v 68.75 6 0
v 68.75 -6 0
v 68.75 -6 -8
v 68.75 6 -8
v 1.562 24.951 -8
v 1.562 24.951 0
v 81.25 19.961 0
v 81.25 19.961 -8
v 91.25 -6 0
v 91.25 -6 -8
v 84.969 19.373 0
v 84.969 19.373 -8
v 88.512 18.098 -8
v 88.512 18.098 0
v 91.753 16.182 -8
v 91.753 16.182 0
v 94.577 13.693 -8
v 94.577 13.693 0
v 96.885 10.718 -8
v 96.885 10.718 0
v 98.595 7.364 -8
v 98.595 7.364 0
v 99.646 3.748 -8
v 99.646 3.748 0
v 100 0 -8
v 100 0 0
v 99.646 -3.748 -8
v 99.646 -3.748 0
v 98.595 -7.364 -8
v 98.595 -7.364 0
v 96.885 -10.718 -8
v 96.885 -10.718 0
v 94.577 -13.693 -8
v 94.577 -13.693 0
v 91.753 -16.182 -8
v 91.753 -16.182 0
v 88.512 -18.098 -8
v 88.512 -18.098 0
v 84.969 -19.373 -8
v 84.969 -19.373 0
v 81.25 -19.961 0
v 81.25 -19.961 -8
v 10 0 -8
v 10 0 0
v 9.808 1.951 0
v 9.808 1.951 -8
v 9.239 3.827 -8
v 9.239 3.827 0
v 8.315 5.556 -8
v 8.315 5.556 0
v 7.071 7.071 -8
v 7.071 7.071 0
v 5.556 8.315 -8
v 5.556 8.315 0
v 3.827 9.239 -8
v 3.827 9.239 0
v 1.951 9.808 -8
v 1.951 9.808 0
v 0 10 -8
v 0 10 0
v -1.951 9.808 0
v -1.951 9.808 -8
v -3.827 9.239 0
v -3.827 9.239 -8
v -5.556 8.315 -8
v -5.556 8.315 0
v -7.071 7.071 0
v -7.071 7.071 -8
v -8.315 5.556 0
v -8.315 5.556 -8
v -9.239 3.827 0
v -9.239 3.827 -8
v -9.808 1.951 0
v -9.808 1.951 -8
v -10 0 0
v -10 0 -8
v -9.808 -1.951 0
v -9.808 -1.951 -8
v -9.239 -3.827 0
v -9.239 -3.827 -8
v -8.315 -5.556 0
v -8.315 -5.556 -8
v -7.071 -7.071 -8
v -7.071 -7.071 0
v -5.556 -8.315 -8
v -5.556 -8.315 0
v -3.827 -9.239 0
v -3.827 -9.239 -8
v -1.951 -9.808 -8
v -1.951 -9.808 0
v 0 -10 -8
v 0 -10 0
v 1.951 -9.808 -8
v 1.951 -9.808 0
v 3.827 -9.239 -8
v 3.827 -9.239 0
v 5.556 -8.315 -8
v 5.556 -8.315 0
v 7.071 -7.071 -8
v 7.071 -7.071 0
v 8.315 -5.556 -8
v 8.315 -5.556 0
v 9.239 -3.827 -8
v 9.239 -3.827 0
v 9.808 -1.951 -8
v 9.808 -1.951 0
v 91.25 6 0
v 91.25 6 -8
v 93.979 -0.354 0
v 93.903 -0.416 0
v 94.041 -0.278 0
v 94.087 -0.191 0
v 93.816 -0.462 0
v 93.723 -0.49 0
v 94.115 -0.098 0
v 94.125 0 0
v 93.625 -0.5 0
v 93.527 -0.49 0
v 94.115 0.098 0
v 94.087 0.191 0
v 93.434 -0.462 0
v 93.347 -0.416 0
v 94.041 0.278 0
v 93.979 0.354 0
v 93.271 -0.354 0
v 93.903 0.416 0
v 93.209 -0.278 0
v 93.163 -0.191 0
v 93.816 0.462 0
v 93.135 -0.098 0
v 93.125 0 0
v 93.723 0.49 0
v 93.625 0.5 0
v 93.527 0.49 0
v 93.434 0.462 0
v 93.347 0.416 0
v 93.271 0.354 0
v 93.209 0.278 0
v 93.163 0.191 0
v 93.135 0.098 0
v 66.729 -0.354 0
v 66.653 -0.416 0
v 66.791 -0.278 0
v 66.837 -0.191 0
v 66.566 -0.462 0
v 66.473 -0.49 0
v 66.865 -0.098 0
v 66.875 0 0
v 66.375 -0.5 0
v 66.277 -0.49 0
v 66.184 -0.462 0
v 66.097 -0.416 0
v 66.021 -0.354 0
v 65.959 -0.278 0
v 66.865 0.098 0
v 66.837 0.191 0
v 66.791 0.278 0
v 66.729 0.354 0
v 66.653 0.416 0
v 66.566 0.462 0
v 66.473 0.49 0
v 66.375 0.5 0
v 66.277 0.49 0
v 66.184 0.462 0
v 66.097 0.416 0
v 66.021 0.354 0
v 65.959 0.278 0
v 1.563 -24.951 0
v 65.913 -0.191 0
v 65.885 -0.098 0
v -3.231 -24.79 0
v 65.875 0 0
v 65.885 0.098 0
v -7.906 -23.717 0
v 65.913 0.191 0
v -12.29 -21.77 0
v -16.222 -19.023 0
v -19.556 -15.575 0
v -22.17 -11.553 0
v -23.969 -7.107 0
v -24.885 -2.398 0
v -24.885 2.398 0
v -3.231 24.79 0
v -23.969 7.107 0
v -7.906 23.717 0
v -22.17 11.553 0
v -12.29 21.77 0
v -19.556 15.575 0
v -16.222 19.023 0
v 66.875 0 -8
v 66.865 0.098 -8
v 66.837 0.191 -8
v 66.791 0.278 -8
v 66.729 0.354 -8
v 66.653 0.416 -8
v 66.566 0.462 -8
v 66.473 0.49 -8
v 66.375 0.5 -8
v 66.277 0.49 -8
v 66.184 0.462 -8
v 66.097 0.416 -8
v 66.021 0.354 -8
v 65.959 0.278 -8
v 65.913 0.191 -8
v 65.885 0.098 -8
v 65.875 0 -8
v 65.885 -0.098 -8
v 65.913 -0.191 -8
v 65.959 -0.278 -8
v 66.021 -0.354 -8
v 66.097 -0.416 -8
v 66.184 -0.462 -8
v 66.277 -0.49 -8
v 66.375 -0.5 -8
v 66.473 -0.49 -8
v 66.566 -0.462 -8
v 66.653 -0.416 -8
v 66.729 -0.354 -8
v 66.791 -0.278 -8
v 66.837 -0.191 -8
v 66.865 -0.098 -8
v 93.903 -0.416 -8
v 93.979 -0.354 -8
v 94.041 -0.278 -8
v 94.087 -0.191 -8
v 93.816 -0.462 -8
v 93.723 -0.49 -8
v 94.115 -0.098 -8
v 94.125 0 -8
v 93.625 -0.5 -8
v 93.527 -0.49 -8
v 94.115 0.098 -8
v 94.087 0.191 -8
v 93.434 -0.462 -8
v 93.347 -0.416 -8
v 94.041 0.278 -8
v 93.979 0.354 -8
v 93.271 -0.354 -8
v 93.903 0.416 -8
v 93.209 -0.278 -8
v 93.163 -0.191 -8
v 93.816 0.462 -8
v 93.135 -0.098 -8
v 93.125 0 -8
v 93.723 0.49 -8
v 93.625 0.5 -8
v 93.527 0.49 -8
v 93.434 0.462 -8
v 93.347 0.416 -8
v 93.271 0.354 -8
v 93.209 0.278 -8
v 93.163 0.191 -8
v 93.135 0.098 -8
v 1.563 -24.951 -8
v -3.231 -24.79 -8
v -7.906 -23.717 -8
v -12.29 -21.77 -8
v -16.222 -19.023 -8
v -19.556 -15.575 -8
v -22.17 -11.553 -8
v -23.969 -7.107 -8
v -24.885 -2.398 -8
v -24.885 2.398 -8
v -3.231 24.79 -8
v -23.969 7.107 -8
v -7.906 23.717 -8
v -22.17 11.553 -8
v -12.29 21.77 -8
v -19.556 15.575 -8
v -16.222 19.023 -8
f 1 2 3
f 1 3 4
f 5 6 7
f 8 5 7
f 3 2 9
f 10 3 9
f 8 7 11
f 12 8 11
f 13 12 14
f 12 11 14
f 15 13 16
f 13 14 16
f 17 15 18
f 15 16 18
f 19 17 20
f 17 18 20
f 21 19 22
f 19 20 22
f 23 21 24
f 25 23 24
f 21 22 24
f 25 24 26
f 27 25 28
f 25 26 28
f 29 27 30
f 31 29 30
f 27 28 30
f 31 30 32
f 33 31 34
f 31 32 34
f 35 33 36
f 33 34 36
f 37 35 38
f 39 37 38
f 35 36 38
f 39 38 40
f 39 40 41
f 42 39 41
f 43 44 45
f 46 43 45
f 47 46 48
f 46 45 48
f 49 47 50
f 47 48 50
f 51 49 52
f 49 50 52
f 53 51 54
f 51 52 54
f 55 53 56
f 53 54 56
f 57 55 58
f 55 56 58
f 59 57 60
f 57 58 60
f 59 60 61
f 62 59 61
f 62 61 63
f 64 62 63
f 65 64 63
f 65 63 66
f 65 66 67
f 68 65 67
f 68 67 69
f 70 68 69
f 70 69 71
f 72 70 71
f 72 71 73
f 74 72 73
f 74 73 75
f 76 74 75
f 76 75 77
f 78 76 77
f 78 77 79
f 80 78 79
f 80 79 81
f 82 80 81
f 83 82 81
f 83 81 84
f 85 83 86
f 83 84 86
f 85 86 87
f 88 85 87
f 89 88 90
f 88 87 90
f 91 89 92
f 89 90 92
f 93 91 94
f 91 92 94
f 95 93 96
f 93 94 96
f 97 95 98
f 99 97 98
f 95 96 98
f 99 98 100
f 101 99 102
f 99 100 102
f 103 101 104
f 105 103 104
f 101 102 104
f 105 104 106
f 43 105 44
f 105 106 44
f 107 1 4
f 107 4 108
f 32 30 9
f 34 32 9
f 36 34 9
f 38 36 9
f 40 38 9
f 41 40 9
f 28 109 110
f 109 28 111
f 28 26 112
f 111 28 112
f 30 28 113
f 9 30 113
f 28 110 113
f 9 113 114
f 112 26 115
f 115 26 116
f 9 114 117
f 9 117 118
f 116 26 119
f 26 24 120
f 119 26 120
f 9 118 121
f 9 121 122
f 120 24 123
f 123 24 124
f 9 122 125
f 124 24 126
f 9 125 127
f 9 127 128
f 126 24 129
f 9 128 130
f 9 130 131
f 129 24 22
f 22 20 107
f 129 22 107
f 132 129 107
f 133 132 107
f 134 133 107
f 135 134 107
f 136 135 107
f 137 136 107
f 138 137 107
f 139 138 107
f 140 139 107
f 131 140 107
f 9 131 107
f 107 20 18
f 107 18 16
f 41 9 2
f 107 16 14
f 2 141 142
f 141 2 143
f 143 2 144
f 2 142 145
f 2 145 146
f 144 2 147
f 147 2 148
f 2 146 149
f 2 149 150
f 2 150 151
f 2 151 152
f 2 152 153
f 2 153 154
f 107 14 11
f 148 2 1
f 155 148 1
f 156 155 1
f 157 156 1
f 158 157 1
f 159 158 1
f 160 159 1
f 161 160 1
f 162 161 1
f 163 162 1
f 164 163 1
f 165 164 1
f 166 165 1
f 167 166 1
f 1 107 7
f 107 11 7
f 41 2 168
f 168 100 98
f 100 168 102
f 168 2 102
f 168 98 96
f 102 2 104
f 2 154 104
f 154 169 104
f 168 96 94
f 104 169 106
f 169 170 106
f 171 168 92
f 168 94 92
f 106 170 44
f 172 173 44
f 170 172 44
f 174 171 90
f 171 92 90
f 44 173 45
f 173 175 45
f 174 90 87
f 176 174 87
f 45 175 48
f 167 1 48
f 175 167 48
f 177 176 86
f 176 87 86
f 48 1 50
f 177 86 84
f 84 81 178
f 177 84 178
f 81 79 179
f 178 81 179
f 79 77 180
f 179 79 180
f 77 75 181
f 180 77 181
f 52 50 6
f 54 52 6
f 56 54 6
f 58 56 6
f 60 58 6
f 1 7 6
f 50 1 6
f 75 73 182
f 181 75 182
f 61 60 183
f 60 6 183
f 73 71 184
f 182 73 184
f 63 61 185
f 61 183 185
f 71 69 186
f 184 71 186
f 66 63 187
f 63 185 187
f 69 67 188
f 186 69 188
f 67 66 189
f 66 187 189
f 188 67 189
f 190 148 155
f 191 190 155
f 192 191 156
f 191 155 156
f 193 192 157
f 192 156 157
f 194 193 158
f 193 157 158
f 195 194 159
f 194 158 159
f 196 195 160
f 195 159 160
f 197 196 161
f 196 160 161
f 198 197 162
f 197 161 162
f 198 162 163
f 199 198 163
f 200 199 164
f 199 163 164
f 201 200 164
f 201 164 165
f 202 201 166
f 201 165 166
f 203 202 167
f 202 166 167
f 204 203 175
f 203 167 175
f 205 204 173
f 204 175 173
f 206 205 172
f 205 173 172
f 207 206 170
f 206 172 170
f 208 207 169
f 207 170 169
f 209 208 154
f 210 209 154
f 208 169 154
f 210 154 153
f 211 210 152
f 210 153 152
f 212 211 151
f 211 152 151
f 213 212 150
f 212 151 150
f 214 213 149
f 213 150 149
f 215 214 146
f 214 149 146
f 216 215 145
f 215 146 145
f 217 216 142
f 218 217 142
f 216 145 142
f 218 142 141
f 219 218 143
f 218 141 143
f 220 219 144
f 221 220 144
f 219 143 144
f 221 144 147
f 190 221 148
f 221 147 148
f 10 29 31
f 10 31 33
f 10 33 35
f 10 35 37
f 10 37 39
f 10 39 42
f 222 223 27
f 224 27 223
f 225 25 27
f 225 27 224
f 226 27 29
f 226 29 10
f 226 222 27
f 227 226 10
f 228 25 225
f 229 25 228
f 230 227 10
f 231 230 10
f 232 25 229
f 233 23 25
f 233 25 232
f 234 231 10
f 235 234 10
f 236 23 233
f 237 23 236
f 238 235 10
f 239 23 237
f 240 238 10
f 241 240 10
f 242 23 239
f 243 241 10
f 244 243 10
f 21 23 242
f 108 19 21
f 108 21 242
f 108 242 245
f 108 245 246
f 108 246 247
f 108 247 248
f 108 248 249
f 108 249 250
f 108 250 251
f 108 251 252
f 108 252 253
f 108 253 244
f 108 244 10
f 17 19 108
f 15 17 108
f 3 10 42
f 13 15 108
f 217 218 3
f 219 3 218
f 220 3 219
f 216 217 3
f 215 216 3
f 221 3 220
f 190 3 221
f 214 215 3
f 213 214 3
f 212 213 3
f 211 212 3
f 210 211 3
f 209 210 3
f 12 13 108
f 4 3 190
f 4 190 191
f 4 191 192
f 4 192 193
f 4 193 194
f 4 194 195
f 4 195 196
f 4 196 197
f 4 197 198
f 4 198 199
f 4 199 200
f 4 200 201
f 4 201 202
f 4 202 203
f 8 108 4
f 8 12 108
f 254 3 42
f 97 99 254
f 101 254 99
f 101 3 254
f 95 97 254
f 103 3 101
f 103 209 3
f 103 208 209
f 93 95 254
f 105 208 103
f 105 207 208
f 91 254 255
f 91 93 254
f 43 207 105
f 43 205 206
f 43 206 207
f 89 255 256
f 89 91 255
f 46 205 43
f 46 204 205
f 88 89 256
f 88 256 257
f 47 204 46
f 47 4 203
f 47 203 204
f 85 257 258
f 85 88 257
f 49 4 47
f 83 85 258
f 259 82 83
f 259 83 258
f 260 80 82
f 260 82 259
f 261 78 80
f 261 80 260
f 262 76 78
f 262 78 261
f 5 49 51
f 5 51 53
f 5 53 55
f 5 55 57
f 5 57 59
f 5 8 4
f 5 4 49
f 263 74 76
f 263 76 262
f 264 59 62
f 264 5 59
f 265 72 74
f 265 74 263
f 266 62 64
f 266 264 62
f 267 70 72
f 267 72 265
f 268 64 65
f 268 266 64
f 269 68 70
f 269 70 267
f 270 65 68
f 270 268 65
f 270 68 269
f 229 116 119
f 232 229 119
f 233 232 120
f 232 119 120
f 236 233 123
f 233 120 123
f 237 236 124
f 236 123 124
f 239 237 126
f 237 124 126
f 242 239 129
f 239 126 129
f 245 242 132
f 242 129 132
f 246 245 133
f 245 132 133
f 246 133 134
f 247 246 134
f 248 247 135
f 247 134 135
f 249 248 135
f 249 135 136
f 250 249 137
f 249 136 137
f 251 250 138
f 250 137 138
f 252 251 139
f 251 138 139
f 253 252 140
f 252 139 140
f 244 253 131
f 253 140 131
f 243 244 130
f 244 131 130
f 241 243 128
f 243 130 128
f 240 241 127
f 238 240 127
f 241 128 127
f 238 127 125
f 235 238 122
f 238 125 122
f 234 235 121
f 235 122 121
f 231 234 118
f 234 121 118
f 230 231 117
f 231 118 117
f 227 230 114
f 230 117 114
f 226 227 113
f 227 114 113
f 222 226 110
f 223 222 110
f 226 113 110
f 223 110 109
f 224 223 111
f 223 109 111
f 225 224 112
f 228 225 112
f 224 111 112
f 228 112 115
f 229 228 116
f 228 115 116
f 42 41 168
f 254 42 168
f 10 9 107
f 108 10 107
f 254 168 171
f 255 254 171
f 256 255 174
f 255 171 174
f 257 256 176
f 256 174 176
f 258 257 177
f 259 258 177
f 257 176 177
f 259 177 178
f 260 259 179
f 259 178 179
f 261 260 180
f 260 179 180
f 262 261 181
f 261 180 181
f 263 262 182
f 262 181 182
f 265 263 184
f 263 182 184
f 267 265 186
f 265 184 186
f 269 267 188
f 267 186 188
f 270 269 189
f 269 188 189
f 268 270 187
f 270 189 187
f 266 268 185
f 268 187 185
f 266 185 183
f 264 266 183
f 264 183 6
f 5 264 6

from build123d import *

# Parameters (mm, degrees)
CROQUIS1_R              = 0.8
CROQUIS1_R_2            = 0.5
CROQUIS1_W              = 22.5
CROQUIS1_H              = 12
SALIENTE_EXTRUIR1_DEPTH = 8
CROQUIS2_R              = 10
CORTAR_EXTRUIR1_DEPTH   = 104.387620149


with BuildPart() as part:
    # Croquis1 → Saliente-Extruir1 (new body)
    with BuildSketch(Plane.XY):
        with BuildLine():
            Line((1.5625, 24.951124098), (81.25, 19.960899278))
            ThreePointArc((81.25, 19.960899278), (100, 0), (81.25, -19.960899278))
            Line((81.25, -19.960899278), (1.5625, -24.951124098))
            ThreePointArc((1.5625, -24.951124098), (-25, 0), (1.5625, 24.951124098))
        make_face()
        Circle(CROQUIS1_R, mode=Mode.SUBTRACT)
        with Locations((66.375, 0)):
            Circle(CROQUIS1_R_2, mode=Mode.SUBTRACT)
        with Locations((93.625, 0)):
            Circle(CROQUIS1_R_2, mode=Mode.SUBTRACT)
        with Locations((7.5, 0)):
            Circle(CROQUIS1_R, mode=Mode.SUBTRACT)
        with Locations((0, -7.5)):
            Circle(CROQUIS1_R, mode=Mode.SUBTRACT)
        with Locations((-7.5, 0)):
            Circle(CROQUIS1_R, mode=Mode.SUBTRACT)
        with Locations((0, 7.5)):
            Circle(CROQUIS1_R, mode=Mode.SUBTRACT)
        with Locations((80, 0)):
            Rectangle(CROQUIS1_W, CROQUIS1_H, mode=Mode.SUBTRACT)
    extrude(amount=-SALIENTE_EXTRUIR1_DEPTH)

    # Croquis2 → Cortar-Extruir1 (cut, through all)
    with BuildSketch(Plane.XY):
        Circle(CROQUIS2_R)
    extrude(amount=-CORTAR_EXTRUIR1_DEPTH, mode=Mode.SUBTRACT)


solid = part.part
